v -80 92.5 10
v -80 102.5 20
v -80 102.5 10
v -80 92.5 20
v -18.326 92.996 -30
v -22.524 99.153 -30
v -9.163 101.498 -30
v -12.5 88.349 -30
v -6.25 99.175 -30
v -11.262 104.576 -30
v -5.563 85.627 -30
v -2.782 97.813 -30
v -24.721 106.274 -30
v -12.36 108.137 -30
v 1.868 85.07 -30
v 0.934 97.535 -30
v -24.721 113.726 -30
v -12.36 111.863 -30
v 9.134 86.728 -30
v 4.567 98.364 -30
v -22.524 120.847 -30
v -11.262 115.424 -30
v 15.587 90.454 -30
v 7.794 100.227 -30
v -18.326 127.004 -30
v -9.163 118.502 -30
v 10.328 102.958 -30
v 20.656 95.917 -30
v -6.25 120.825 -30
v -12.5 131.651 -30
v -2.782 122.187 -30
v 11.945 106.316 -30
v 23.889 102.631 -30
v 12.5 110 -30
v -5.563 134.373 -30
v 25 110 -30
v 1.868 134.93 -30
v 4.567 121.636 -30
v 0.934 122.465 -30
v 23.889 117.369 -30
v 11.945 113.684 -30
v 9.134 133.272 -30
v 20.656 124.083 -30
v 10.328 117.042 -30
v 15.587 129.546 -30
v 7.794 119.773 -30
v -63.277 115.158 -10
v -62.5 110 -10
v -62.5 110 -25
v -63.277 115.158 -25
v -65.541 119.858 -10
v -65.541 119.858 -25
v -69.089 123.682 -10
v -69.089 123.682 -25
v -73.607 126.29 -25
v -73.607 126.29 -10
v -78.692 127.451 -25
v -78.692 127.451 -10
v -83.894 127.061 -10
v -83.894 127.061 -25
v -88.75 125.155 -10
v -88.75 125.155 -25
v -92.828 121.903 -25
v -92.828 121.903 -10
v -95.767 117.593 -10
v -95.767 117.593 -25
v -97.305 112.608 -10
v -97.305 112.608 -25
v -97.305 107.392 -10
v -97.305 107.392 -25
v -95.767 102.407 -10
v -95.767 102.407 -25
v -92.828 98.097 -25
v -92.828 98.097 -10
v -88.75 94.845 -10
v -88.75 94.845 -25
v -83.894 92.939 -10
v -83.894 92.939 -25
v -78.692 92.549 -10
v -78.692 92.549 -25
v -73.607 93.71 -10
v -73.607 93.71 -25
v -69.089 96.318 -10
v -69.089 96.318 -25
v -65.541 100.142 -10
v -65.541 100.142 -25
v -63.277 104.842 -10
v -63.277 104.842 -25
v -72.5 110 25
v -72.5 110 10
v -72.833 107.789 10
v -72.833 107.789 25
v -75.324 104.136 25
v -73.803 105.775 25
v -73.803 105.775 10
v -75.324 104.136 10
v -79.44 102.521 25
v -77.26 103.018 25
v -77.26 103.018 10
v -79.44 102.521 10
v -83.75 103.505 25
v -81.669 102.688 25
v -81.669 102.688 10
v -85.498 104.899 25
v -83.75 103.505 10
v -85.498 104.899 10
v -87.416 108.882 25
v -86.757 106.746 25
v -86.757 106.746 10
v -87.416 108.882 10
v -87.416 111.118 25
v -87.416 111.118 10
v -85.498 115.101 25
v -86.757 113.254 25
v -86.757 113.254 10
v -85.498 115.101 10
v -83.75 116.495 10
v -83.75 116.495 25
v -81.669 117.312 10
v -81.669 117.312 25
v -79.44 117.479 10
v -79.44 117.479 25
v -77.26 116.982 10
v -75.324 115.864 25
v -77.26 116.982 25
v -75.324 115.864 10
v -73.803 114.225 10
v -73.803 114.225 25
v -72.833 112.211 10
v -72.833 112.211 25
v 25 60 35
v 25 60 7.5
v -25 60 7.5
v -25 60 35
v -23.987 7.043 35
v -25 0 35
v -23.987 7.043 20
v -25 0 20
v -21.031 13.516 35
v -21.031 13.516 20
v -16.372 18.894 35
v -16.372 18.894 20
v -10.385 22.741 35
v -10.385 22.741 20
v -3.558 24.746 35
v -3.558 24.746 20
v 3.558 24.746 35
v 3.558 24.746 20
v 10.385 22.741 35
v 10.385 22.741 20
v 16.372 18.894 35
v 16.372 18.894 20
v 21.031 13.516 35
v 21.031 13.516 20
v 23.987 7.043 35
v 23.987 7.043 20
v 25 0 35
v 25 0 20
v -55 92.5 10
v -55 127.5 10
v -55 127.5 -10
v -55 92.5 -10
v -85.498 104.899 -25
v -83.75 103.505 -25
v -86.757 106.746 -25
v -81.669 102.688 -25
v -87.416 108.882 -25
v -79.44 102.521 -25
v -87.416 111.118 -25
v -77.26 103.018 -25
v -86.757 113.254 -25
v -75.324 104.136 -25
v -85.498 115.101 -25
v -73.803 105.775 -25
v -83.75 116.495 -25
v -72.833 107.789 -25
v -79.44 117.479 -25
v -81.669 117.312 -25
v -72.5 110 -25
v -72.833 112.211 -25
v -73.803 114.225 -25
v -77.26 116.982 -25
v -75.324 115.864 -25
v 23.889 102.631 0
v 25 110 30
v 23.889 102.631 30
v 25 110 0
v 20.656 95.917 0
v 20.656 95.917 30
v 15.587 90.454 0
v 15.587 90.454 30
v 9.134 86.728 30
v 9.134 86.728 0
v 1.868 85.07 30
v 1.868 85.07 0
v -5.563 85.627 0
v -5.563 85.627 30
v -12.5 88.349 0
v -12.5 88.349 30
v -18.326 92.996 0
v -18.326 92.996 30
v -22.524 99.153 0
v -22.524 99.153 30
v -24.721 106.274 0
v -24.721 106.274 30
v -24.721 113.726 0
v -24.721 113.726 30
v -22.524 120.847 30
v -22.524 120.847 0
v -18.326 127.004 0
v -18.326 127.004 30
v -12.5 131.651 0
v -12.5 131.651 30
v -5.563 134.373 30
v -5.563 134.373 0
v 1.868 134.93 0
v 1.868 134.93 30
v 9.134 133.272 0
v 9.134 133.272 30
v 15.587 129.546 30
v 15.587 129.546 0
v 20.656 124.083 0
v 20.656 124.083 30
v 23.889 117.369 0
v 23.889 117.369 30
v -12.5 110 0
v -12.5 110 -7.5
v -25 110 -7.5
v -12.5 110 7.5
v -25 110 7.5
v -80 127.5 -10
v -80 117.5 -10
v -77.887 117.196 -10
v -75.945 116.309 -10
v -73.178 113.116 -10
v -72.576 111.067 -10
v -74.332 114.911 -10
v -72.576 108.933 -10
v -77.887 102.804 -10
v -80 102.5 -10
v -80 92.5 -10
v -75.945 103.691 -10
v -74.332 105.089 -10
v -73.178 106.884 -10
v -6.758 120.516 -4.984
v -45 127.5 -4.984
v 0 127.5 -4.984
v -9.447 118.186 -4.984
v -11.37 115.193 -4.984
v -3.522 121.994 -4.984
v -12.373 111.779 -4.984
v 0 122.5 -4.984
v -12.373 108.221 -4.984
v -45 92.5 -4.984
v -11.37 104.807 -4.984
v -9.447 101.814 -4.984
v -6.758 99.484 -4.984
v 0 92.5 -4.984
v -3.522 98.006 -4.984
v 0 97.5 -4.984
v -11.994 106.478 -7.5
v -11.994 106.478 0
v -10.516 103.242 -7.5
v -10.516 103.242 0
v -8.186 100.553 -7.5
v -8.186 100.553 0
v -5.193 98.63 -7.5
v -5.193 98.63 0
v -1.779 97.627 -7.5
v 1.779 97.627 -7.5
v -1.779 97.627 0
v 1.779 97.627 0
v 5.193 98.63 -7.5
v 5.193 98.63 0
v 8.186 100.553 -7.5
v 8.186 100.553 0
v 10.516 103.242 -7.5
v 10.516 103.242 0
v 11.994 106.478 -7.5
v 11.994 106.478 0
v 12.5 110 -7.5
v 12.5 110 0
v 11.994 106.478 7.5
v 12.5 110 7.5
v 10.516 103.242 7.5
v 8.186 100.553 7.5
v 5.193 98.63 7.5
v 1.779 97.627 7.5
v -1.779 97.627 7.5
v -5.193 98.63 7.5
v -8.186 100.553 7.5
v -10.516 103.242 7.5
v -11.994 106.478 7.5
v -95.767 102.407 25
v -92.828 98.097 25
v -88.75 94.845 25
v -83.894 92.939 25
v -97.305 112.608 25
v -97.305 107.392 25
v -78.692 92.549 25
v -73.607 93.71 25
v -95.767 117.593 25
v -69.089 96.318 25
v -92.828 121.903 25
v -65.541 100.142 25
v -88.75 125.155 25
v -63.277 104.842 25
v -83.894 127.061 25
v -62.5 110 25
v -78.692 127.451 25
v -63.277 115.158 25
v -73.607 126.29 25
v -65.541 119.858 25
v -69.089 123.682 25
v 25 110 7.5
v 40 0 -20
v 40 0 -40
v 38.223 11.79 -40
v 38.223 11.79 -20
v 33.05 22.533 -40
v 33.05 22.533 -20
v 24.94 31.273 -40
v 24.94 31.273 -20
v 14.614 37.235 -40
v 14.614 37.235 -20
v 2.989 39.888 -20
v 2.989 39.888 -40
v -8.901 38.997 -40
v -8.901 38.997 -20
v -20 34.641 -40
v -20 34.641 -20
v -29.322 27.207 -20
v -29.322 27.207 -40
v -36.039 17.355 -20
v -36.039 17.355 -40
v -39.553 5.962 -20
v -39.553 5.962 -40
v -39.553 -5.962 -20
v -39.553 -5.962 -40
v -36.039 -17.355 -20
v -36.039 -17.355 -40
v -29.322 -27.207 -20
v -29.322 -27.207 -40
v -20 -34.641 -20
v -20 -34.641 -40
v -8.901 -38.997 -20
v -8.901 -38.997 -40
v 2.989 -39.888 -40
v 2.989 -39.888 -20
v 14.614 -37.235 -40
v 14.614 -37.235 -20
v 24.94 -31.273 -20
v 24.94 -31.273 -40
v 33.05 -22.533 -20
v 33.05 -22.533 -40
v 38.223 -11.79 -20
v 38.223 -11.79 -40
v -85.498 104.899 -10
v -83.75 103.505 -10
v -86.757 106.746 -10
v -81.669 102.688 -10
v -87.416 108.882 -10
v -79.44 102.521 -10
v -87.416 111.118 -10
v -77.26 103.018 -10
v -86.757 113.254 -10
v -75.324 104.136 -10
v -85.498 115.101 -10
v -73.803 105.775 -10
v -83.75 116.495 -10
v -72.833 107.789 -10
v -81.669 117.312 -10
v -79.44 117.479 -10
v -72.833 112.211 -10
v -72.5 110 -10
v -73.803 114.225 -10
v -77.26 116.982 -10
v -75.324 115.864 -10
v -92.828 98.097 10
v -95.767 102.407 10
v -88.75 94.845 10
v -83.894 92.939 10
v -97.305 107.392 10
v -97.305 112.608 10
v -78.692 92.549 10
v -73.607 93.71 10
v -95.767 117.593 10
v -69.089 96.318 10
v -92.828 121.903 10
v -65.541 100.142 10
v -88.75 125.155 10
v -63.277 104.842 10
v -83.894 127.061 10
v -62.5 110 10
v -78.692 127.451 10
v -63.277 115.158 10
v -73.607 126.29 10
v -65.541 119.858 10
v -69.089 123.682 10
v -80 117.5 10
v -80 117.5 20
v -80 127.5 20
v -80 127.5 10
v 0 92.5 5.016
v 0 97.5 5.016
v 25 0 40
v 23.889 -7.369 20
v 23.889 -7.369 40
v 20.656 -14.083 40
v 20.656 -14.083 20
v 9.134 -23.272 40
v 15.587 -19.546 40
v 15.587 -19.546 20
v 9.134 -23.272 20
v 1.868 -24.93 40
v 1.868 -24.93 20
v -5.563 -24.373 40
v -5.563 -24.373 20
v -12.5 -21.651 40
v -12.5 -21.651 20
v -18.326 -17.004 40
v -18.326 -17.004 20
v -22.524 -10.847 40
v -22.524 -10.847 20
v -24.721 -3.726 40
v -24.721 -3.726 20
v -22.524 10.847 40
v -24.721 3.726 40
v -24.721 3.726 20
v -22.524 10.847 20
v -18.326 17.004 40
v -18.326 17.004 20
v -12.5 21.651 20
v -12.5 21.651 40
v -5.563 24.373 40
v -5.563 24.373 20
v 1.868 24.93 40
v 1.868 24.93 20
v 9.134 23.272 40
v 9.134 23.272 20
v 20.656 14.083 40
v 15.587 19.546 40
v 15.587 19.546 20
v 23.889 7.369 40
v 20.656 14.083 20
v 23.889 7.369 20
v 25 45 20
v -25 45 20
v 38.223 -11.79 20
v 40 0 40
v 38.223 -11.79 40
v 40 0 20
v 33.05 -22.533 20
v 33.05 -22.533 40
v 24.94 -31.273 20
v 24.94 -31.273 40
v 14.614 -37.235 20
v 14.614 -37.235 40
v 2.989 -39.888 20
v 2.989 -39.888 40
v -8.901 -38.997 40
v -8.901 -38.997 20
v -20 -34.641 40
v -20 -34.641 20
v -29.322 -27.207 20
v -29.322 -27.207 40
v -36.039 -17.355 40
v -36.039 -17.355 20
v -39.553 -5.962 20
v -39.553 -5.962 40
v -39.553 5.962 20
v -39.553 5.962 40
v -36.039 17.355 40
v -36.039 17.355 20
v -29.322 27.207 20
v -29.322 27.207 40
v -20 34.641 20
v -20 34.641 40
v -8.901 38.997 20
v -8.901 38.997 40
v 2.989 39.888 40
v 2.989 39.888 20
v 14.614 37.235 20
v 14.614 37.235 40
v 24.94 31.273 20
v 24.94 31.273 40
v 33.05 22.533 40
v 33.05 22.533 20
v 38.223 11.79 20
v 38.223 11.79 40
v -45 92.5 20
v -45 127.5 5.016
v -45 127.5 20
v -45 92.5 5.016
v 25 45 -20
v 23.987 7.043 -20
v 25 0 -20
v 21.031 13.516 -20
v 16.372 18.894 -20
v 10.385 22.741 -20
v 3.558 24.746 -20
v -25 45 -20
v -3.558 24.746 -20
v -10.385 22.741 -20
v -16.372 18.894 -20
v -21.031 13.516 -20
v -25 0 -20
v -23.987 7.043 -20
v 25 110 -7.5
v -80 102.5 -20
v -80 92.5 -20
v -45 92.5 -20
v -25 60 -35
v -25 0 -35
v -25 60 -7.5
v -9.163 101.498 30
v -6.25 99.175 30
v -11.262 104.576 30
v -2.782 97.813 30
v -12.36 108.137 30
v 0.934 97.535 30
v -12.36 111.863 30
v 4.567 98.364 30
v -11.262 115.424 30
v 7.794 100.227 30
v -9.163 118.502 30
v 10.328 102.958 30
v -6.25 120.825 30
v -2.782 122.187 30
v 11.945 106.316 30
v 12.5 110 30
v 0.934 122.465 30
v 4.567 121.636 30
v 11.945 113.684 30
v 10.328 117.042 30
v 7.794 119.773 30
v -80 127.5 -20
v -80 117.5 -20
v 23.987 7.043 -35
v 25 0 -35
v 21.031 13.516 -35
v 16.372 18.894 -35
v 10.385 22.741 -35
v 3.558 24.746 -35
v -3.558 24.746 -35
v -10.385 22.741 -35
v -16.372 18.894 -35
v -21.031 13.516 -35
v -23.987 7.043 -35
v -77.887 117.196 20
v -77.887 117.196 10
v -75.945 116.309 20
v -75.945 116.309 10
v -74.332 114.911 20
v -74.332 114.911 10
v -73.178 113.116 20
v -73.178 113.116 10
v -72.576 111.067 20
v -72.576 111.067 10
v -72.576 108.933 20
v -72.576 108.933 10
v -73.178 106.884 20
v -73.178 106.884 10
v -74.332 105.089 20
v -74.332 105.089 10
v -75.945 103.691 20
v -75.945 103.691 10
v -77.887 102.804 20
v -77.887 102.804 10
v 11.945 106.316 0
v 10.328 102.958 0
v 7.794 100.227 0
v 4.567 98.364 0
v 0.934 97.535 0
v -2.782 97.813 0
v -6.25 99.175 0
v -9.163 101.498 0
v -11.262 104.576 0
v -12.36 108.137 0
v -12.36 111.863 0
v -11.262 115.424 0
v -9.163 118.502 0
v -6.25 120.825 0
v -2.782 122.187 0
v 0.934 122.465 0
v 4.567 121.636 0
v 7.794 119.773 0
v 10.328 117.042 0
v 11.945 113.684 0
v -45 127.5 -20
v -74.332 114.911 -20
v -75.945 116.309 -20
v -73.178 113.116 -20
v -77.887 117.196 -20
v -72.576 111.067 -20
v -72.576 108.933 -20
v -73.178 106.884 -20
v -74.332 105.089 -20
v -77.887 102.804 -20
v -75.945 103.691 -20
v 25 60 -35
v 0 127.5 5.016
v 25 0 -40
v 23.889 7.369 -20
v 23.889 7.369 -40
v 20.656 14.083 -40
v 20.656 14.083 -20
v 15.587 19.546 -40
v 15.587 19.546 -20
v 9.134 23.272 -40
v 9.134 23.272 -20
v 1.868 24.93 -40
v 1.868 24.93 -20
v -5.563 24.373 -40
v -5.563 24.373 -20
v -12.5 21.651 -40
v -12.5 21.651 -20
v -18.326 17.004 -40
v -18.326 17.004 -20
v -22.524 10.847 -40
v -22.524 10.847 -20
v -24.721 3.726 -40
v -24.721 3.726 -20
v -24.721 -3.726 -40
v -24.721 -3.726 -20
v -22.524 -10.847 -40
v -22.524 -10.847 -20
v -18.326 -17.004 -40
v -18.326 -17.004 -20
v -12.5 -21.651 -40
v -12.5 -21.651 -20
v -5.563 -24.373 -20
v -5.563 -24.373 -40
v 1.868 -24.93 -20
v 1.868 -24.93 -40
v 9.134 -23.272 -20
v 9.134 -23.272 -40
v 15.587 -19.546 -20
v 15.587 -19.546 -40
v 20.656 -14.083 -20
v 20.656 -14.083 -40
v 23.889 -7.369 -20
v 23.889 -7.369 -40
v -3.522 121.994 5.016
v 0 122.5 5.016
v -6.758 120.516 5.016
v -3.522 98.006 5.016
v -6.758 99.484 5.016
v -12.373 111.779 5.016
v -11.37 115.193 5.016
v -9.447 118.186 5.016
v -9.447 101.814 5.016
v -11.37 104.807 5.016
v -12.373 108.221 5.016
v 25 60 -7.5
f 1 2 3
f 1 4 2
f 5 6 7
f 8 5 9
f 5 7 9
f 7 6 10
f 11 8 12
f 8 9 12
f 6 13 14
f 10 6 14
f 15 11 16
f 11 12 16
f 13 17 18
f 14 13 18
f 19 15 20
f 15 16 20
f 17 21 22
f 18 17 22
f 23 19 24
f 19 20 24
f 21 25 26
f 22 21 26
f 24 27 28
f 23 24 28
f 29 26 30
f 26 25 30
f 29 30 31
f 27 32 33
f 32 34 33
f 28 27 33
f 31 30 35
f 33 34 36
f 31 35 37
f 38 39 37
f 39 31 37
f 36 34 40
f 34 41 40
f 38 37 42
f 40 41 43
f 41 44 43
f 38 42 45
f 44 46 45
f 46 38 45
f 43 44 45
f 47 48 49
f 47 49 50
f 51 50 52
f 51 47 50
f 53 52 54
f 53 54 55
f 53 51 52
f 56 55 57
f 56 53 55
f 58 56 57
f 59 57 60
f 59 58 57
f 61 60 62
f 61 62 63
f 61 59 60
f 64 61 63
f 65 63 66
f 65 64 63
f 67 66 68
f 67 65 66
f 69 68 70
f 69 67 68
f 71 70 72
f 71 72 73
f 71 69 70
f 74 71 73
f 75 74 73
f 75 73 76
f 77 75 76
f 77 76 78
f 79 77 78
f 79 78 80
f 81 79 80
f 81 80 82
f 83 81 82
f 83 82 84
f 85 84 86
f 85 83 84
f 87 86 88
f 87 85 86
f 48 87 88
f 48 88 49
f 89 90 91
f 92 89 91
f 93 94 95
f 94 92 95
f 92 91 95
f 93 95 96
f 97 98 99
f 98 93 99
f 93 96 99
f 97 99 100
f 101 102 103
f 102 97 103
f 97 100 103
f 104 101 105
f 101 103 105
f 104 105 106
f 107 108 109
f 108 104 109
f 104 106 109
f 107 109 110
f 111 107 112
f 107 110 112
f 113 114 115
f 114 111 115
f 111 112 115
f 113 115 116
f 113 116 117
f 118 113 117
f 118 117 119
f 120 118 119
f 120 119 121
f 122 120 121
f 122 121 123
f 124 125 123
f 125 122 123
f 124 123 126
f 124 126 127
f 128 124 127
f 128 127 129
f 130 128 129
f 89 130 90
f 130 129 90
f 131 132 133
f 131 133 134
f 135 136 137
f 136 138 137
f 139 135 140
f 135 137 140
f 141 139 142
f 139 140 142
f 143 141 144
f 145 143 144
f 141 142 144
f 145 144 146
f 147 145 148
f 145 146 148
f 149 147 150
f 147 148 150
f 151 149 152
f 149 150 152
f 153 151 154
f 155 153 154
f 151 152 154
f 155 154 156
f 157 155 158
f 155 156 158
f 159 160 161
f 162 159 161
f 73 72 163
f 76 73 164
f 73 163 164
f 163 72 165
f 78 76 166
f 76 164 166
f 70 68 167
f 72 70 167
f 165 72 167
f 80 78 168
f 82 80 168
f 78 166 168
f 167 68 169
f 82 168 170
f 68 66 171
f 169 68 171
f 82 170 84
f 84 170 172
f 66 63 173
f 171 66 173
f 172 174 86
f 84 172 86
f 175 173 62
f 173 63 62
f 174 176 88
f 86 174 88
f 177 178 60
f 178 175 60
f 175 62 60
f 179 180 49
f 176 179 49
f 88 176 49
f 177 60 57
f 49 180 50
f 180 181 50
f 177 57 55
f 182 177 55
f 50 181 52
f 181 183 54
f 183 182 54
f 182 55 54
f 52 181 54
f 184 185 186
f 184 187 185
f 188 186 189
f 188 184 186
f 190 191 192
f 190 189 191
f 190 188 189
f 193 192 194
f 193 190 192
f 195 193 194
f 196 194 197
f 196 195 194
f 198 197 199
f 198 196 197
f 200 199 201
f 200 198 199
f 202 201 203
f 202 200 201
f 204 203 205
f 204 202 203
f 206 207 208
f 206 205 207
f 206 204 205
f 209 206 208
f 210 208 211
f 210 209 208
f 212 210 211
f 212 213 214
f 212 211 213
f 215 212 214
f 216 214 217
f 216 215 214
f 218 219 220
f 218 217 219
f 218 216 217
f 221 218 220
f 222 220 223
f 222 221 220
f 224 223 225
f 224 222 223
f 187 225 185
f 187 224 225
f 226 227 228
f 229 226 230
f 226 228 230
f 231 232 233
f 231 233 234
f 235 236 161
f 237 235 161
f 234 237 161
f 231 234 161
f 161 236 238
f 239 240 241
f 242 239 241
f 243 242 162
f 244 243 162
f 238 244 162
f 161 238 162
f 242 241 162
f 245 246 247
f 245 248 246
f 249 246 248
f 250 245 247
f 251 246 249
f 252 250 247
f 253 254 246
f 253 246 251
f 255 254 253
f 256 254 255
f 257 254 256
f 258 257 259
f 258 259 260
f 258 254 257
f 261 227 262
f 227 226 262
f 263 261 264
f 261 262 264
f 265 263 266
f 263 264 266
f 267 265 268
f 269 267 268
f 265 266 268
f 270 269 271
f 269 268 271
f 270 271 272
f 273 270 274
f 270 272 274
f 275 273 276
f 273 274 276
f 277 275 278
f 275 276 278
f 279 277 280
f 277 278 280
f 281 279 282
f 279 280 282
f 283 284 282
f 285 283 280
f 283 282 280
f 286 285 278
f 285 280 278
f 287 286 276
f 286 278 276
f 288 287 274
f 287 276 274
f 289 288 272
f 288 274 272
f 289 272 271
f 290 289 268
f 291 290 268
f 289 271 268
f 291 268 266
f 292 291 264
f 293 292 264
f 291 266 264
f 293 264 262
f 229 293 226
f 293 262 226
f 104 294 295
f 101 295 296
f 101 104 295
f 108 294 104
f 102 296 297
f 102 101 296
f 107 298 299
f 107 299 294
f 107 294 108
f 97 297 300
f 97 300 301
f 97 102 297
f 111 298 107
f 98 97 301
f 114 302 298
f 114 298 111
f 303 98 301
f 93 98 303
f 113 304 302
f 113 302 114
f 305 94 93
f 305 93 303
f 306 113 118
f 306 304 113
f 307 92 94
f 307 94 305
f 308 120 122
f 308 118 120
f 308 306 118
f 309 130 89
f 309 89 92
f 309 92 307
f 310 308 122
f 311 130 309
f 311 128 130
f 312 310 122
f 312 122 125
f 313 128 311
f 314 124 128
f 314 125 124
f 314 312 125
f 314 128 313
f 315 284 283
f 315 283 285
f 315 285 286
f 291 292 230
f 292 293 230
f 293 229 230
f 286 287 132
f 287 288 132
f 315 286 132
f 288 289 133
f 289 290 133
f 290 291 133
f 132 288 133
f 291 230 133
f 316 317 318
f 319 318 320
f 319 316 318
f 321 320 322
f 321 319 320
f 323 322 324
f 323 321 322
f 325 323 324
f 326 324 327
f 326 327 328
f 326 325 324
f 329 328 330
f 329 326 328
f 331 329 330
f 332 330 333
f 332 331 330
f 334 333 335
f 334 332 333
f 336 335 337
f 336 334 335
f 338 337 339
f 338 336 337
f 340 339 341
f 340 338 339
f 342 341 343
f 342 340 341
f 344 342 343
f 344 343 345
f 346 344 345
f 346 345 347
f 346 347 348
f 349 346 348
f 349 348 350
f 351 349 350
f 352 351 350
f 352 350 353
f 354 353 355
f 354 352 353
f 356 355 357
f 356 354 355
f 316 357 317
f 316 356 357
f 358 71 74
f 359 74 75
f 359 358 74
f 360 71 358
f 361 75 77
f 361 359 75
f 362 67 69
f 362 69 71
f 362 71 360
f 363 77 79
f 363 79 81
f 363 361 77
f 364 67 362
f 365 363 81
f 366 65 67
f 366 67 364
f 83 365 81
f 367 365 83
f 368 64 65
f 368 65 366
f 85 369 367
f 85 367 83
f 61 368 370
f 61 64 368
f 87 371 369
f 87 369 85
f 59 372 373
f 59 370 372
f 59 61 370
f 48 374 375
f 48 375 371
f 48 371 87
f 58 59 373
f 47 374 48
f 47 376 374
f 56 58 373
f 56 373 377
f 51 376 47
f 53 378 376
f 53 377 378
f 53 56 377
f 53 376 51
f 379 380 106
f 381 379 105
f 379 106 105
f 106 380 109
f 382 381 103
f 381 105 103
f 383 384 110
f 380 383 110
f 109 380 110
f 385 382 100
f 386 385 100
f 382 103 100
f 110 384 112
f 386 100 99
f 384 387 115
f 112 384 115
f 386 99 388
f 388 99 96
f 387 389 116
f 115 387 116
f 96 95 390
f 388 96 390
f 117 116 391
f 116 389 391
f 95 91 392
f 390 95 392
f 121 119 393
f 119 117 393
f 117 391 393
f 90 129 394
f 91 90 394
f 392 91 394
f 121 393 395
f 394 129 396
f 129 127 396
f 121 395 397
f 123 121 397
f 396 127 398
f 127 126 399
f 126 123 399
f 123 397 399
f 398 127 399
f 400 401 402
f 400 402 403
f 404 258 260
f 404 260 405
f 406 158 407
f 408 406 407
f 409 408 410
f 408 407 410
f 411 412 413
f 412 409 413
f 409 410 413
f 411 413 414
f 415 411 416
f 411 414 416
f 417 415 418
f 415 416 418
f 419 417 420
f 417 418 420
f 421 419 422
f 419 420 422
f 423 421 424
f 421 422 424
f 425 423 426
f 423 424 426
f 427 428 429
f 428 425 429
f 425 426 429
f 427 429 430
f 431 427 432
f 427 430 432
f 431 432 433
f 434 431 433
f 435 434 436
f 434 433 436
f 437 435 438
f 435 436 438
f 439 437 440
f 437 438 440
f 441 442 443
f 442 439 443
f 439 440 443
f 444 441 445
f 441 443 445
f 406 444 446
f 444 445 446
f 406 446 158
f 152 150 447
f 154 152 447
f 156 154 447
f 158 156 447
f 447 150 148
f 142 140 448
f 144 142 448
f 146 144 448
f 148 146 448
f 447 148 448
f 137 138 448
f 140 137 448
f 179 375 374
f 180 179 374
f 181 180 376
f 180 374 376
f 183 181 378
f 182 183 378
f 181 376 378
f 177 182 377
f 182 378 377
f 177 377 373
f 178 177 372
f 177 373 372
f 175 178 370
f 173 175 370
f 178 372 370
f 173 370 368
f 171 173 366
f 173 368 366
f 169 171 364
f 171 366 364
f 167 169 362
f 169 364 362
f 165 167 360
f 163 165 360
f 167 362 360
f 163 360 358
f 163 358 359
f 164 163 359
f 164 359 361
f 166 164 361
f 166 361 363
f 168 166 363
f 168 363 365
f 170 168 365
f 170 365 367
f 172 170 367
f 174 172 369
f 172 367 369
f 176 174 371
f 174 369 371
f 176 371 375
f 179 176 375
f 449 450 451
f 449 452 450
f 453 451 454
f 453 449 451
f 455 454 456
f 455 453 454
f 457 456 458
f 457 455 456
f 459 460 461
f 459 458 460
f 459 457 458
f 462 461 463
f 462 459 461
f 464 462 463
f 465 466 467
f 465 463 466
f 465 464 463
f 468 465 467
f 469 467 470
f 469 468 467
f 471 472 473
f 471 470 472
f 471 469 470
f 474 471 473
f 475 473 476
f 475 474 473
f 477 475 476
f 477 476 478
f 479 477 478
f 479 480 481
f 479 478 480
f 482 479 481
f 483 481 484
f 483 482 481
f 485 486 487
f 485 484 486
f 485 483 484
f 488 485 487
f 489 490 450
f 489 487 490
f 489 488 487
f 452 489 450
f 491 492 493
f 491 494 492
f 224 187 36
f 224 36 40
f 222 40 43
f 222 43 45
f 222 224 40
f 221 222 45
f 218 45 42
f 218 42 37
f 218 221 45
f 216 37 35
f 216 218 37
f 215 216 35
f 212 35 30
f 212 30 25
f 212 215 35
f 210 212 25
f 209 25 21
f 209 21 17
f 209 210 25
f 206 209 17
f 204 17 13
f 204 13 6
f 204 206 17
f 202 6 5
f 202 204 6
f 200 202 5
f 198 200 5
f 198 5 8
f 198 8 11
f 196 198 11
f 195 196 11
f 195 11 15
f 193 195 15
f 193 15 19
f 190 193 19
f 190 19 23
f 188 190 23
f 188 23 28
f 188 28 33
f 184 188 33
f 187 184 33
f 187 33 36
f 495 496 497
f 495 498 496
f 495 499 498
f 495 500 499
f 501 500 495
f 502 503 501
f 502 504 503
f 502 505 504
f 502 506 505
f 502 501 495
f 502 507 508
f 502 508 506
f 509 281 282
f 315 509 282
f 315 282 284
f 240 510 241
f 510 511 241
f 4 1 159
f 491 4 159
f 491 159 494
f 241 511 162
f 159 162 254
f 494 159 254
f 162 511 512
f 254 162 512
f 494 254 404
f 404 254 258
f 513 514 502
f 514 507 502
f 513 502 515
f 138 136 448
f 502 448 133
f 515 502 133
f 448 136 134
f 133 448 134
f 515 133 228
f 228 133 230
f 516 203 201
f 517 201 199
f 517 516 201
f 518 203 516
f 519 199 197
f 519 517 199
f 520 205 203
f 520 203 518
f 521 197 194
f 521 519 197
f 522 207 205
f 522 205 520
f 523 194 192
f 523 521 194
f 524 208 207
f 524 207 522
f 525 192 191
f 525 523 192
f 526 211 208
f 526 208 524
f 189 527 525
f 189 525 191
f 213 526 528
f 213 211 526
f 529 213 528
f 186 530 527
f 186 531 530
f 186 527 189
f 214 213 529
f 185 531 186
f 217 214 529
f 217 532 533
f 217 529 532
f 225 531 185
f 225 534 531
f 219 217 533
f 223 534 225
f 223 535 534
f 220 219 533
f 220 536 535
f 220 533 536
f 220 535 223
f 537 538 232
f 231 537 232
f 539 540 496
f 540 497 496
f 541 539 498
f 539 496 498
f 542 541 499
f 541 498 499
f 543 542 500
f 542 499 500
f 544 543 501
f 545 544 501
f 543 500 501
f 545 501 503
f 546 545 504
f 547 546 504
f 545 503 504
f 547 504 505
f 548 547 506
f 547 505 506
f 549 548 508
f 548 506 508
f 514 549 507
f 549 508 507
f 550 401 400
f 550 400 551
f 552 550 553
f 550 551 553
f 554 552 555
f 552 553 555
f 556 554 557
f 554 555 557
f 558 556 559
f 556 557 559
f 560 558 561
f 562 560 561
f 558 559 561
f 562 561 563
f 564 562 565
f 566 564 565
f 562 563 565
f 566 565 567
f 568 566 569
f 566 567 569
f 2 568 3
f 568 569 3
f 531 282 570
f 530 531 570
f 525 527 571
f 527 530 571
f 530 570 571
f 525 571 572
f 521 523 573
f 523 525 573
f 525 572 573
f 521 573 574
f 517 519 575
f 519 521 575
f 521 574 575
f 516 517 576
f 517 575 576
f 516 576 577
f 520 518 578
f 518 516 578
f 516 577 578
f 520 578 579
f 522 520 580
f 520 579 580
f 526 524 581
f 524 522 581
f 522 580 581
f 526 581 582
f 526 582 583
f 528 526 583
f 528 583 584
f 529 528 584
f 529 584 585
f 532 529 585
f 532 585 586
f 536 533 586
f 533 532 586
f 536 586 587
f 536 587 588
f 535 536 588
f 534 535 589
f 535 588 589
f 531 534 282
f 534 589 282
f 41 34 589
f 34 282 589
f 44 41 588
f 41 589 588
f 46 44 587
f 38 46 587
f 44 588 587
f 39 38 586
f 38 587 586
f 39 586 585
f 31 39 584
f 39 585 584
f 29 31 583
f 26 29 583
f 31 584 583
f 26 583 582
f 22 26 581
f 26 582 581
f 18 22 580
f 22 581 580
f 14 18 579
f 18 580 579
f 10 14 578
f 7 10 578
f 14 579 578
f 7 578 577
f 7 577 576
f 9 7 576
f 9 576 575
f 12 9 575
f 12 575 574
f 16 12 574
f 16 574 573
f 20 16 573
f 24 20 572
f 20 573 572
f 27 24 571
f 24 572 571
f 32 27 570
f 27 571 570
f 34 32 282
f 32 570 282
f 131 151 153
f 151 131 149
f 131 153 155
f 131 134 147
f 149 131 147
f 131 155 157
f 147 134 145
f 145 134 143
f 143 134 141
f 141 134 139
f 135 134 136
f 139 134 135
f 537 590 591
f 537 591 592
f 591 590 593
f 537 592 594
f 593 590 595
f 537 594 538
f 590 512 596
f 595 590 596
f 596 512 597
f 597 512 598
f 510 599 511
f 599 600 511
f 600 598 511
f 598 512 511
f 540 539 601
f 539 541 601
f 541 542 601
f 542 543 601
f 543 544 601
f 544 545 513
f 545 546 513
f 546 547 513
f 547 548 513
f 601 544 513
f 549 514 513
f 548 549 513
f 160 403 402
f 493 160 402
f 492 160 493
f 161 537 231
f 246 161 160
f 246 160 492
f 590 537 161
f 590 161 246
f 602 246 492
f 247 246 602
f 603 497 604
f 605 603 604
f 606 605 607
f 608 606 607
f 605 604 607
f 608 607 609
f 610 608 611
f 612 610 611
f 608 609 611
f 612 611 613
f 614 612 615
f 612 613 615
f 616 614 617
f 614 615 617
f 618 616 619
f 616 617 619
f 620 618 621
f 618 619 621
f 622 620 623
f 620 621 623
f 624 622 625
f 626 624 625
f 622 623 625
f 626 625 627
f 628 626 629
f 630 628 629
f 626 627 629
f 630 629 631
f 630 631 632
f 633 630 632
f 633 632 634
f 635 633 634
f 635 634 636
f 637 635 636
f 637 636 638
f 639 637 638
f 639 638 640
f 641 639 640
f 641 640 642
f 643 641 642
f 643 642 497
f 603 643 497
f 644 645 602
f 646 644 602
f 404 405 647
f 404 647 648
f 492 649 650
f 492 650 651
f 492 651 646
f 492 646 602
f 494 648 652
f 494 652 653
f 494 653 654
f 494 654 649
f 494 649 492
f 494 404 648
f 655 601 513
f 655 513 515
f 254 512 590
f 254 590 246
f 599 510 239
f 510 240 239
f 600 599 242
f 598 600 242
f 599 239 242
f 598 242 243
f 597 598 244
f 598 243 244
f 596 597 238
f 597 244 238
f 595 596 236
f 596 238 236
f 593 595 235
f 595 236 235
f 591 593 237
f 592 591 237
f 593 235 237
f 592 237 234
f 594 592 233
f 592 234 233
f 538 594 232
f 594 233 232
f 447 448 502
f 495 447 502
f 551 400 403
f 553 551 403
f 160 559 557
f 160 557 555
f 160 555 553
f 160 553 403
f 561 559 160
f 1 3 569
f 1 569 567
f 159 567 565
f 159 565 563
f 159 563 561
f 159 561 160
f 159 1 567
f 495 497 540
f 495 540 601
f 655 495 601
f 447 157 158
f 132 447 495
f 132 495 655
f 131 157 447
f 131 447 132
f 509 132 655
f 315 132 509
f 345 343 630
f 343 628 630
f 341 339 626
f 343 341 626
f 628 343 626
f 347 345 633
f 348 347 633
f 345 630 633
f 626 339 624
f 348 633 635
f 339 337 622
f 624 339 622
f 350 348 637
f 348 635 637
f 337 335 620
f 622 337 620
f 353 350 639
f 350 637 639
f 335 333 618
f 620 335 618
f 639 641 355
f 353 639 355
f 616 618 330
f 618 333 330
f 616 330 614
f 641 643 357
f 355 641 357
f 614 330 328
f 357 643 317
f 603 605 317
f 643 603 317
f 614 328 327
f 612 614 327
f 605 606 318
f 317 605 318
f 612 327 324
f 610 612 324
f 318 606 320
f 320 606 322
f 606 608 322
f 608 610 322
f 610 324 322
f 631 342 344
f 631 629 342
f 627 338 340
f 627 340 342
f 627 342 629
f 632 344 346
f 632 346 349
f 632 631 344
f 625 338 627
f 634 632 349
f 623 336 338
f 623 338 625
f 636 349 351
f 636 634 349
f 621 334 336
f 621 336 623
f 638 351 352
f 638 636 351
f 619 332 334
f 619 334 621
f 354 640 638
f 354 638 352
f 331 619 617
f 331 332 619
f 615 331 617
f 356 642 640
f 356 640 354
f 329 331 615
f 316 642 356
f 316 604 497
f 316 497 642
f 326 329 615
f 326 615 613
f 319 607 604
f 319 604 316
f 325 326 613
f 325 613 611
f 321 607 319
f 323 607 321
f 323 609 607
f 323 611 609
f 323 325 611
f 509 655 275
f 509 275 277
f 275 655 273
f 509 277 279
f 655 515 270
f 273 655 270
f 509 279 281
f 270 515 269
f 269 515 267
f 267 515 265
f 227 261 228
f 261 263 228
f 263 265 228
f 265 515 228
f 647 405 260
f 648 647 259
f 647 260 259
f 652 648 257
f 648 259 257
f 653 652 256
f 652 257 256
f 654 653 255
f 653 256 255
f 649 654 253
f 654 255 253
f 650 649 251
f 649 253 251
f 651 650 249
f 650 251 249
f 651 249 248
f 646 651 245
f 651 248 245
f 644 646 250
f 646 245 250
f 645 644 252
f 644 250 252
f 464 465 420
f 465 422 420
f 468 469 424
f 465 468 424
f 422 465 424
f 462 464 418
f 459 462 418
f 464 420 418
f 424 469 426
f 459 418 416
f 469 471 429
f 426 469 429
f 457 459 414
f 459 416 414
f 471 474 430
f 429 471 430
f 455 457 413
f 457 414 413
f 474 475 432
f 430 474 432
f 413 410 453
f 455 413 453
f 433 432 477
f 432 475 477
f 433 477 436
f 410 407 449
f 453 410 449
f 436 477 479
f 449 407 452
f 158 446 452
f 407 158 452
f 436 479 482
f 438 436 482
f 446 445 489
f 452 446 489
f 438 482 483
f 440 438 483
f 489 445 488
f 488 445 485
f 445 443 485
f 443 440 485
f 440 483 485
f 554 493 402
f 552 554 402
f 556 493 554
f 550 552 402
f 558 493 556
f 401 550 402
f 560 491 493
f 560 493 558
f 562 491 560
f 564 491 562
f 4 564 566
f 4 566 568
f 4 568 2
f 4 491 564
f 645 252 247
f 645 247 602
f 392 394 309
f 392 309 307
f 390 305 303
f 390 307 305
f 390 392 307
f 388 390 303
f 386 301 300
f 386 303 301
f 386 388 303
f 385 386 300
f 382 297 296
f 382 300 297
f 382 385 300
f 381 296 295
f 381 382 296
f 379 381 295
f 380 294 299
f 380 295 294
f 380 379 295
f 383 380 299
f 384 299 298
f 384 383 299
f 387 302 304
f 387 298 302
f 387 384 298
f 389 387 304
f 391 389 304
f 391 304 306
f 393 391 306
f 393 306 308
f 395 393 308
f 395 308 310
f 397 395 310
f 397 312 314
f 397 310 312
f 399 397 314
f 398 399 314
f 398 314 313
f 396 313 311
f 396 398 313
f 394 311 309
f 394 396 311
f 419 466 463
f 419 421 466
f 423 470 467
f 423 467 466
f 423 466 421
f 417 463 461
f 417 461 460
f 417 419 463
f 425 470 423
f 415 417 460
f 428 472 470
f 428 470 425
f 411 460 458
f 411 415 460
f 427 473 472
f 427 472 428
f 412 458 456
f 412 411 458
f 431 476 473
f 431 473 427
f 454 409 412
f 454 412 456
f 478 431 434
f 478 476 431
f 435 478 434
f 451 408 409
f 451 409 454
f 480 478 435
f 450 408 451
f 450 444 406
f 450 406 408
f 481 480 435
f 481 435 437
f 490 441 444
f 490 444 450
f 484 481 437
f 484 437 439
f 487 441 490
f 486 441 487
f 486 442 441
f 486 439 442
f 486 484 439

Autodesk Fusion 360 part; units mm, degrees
sketch "Sketch1" plane through (0, 0, 0) normal (0, 0, 1) x (1, 0, 0)
  circle A0 centre (0, 0) radius 25
  circle A1 centre (0, 0) radius 40
  circle A2 centre (0, 110) radius 12.5
  circle A3 centre (0, 110) radius 25
  circle A4 centre (-80, 110) radius 7.5
  circle A5 centre (-80, 110) radius 17.5
  dimension "d5" = 50
  dimension "d6" = 80
  dimension "d7" = 25
  dimension "d8" = 50
  dimension "d9" = 110
  dimension "d10" = 15
  dimension "d11" = 35
  dimension "d12" = 80
extrude "Extrude1" add sketch "Sketch1" along normal blind 10 from surface at 20 contours A1 makes body 1
extrude "Extrude2" add sketch "Sketch1" against normal blind 10 from surface at -20 separate body contours A1 makes body 2
extrude "Extrude3" add sketch "Sketch1" along normal blind 15 from surface at 10 separate body contours A5 makes body 3
extrude "Extrude4" add sketch "Sketch1" against normal blind 15 from surface at -10 separate body contours A5 makes body 4
extrude "Extrude5" add sketch "Sketch1" along normal mid plane 60 separate body contours A3 makes body 5
extrude "Extrude6" add 1 faces at (34.758, -3.2292, 30) along direction (0, 0, 1) blind 10 on bodies 1 bodies 1
extrude "Extrude7" add 1 faces at (34.758, -3.2292, -30) along direction (0, 0, -1) blind 10 on bodies 2 bodies 2
sketch "Sketch3" plane through (0, 0, 0) normal (1, 0, 0) x (0, 1, 0)
  line L0 (0, 20) -> (45, 20)
  line L1 (45, 20) -> (45, 35)
  line L2 (45, 35) -> (0, 35)
  line L3 (0, 35) -> (0, 20)
  line L4 (0, -20) -> (45, -20)
  line L5 (45, -20) -> (45, -35)
  line L6 (45, -35) -> (0, -35)
  line L7 (0, -35) -> (0, -20)
  line L8 (45, -35) -> (60, -35)
  line L9 (60, -35) -> (60, 35)
  line L10 (60, 35) -> (45, 35)
  line L11 (45, 35) -> (45, -35)
  line L12 (45, -7.5) -> (110, -7.5)
  line L13 (110, -7.5) -> (110, 7.5)
  line L14 (110, 7.5) -> (45, 7.5)
  line L15 (45, 7.5) -> (45, -7.5)
  dimension "d33" = 45
  dimension "d34" = 15
  dimension "d35" = 45
  dimension "d36" = 15
  dimension "d37" = 15
  dimension "d38" = 70
  dimension "d39" = 65
  dimension "d40" = 15
  dimension "d41" = 27.5
  dimension "d42" = 27.5
extrude "Extrude8" add sketch "Sketch3" along normal mid plane 50 separate body makes body 6
extrude "Extrude9" cut sketch "Sketch1" along normal mid plane 144.06 contours A2 bodies 6
extrude "Extrude10" cut sketch "Sketch1" along normal mid plane 135.33 contours A0 bodies 6
sketch "Sketch4" plane through (0, 0, 0) normal (0, 1, 0) x (1, 0, 0)
  line L0 (-101.7969, -25.8958) -> (-101.7969, 10)
ref_plane "WorkPlane1" through (-80, 110, 17.5) normal (0, 1, 0) x (0, 0, 1)
sketch "Sketch5" plane through (-80, 110, 17.5) normal (0, 1, 0) x (1, 0, 0)
  line L0 (17.5, 42.5) -> (-17.5, 42.5)
  line L1 (-17.5, 27.5) -> (17.5, 27.5)
  line L2 (17.5, 27.5) -> (17.5, 42.5)
  line L3 (-17.5, 27.5) -> (-17.5, 42.5)
  line L4 (-17.5, -7.5) -> (17.5, -7.5)
  line L5 (-17.5, 7.5) -> (17.5, 7.5)
  line L6 (-17.5, 7.5) -> (-17.5, -7.5)
  line L7 (17.5, 7.5) -> (17.5, -7.5)
  line L8 (105, 47.5) -> (55, 47.5)
  line L9 (55, -12.5) -> (105, -12.5)
  line L10 (55, 47.5) -> (55, -12.5)
  line L11 (105, 47.5) -> (105, -12.5)
  line L12 (0, 7.5) -> (25, 7.5)
  line L13 (25, 7.5) -> (25, -2.5)
  line L14 (25, -2.5) -> (0, -2.5)
  line L15 (0, -2.5) -> (0, 7.5)
  line L16 (0, 27.5) -> (25, 27.5)
  line L17 (25, 27.5) -> (25, 37.5)
  line L18 (25, 37.5) -> (0, 37.5)
  line L19 (0, 37.5) -> (0, 27.5)
  line L20 (25, 37.5) -> (35, 37.5)
  line L21 (35, 37.5) -> (35, -2.5)
  line L22 (35, -2.5) -> (25, -2.5)
  line L23 (25, -2.5) -> (25, 37.5)
  line L24 (25, 22.4841) -> (80, 22.4841)
  line L25 (80, 22.4841) -> (80, 12.4841)
  line L26 (80, 12.4841) -> (25, 12.4841)
  line L27 (25, 12.4841) -> (25, 22.4841)
  dimension "d53" = 25
  dimension "d54" = 10
  dimension "d55" = 25
  dimension "d56" = 10
  dimension "d57" = 10
  dimension "d58" = 55
  dimension "d59" = 10
extrude "Extrude11" add sketch "Sketch5" along normal mid plane 35 separate body contours L2 L16 L17 L18 L23 | L1 L2 L16 L18 L19 | L17 L20 L21 L23 L24 | L21 L23 L24 L26 L27 | L10 L21 L24 L26 | L13 L21 L22 L23 L26 | L10 L24 L25 L26 | L7 L12 L13 L14 L23 | L5 L7 L12 L14 L15 makes body 7
extrude "Extrude12" cut sketch "Sketch1" along normal mid plane 104.95 contours A2 bodies 7
extrude "Extrude13" cut sketch "Sketch1" along normal mid plane 79.018 contours A4 bodies 7
